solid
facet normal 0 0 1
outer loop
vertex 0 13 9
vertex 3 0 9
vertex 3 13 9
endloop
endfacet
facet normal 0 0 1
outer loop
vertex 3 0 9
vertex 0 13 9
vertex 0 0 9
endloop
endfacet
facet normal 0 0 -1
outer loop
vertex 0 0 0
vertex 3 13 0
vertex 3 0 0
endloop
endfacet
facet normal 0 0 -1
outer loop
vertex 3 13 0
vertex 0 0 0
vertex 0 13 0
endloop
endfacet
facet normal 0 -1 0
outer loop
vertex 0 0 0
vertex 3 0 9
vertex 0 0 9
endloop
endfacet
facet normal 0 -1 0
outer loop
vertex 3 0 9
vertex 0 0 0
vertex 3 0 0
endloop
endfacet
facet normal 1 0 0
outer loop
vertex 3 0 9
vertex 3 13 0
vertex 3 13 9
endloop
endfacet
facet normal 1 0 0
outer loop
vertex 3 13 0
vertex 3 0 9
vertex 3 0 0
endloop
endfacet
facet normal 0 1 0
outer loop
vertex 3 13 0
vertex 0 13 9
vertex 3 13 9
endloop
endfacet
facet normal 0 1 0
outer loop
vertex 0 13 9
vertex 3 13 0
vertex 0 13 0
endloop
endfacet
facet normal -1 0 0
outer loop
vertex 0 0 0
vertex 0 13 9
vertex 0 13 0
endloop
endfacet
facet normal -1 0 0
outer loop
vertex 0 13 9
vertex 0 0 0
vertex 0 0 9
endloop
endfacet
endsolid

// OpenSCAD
// Generated by SolidPython 1.0.1 on 2020-07-29 00:46:54


cube(size = [3, 13, 9]);
/***********************************************
*********      SolidPython code:      **********
************************************************
 
# import packages: SolidPython
from solid import *
from solid.utils import *
from itertools import chain, combinations, permutations


class Resize:

    def __init__(self, scad_file):
        self.scad_file = scad_file
        #self.scad_file = import_scad(scad_file)
        # cone/cylinder param:
        self.r1 = 0
        self.r2 = 0
        self.h = 0
        # rectangular prism param:
        self.w = 0
        self.l = 0
        # ellipse param:
        self.r = 0

    # import OpenScad code (file name corresponds to shape)


    # classify shape + parameters
    def assign(self, param1, param2, param3):
        if self.scad_file == 'cone.scad':
            self.r1 = param1
            self.r2 = param2
            self.h = param3
        elif self.scad_file == 'cylinder.scad':
            self.r1 = param1
            self.r2 = param2
            self.h = param3
        elif self.scad_file == 'rectangularPrism.scad':
            self.h = param1
            self.l = param2
            self.w = param3
        else:
            self.r = param1
            self.h = param2

    # resize parameters
    def iterate(self):
        x = range(3, 20, 2)
        i = 1
        if self.scad_file == 'cone.scad':
            tempList = list(permutations(x, 2))
            for temp in tempList:
                param1 = temp[0]
                param2 = temp[1]
                filepath = 'produced_scad_files/' + 'cone' + str(param1) + '_' + str(param2) + '_' + '.scad'
                scad_render_to_file(cylinder(h=param1, r1=param2, r2=0), filepath)

        elif self.scad_file == 'cylinder.scad':
            tempList = list(permutations(x, 3))
            for temp in tempList:
                param1 = temp[0]
                param2 = temp[1]
                filepath = 'produced_scad_files/' + 'cylinder' + str(param1) + '_' + str(param2) + '_' + '.scad'
                scad_render_to_file(cylinder(h=param1, r1=param2, r2=param2), filepath)

        elif self.scad_file == 'rectangularPrism.scad':
            tempList = list(permutations(x, 3))
            for temp in tempList:
                param1 = temp[0]
                param2 = temp[1]
                param3 = temp[2]
                filepath = 'produced_scad_files/' + 'rectangularPrism' + str(param1) + '_' + str(param2) + '_' + str(
                    param3) + '.scad'
                scad_render_to_file(cube(size=(param1, param2, param3)), filepath)

        elif self.scad_file == 'ellipse.scad':
            tempList = list(permutations(x, 4))
            for temp in tempList:
                param1 = temp[0]
                param2 = temp[1]
                param3 = temp[2]
                param4 = temp[3]
                filepath = 'produced_scad_files/' + 'ellipse' + str(param1) + '_' + str(param2) + '_' + str(param3) + '_' + str(param4) + '.scad'
                scad_render_to_file(scale([param1, param2, param3])(sphere(r=param4)), filepath)

    def render_to_scadfile(self):
        scad_render_to_file(scad, 'example.scad') 
 
************************************************/
